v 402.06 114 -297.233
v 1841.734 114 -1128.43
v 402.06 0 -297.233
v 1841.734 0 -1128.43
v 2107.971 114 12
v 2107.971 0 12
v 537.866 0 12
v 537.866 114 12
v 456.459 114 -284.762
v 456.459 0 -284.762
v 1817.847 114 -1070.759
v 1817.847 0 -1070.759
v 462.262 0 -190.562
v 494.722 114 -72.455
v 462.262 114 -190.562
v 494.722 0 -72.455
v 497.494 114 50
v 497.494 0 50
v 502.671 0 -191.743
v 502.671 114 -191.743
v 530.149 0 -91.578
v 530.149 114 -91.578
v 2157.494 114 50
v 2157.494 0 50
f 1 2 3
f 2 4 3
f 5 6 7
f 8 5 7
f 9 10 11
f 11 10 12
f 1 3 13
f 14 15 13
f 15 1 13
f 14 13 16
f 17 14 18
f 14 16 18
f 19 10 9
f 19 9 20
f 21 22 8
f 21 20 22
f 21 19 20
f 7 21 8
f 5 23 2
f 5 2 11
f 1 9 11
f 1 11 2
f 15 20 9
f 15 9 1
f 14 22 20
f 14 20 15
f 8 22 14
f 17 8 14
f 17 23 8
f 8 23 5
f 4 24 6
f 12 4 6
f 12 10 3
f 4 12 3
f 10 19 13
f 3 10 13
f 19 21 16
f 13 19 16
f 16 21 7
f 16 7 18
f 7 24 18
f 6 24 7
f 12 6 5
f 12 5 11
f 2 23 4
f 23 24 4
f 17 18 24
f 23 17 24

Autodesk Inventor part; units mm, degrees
ref_plane "YZ Plane" through (0, 0, 0) normal (1, 0, 0) x (0, 1, 0)
ref_plane "XZ Plane" through (0, 0, 0) normal (0, 1, 0) x (-1, 0, 0)
ref_plane "XY Plane" through (0, 0, 0) normal (0, 0, 1) x (1, 0, 0)
sketch "Sketch1" plane through (0, 0, 0) normal (0, 1, 0) x (-1, 0, 0)
  line L0 (0, 0) -> (-3000, 0) construction
  line L1 (0, 0) -> (-2598.0762, -1500) construction
  line L2 (0, 0) -> (3000, 0) construction
  arc A0 (-497.4937, 50) -> (-402.0602, -297.2332) centre (0, 0) ccw
  line L3 (-497.4937, 50) -> (-2157.4937, 50)
  line L4 (-2157.4937, 50) -> (-1841.7345, -1128.4295)
  line L5 (-2157.4937, 50) -> (-937.4937, 50) construction
  line L6 (-1841.7345, -1128.4295) -> (1158.2655, -1128.4295) construction
  line L7 (-1841.7345, -1128.4295) -> (-402.0602, -297.2332)
  arc A1 (-537.8662, 12) -> (-456.459, -284.7617) centre (0, 0) ccw
  line L8 (-2107.9712, 12) -> (-537.8662, 12)
  line L9 (-456.459, -284.7617) -> (-1817.8467, -1070.7593)
  line L10 (-2107.9712, 12) -> (-1817.8467, -1070.7593)
  dimension "d1" = 3000
  dimension "d2" = 150
  dimension "d3" = 1000
  dimension "d11" = 50
  dimension "d12" = 1660
  dimension "d13" = 1220
  dimension "d14" = 75
extrude "Extrusion2" add sketch "Sketch1" along normal blind 114
properties part number "panelAflat" material "Wood (Birch)"
